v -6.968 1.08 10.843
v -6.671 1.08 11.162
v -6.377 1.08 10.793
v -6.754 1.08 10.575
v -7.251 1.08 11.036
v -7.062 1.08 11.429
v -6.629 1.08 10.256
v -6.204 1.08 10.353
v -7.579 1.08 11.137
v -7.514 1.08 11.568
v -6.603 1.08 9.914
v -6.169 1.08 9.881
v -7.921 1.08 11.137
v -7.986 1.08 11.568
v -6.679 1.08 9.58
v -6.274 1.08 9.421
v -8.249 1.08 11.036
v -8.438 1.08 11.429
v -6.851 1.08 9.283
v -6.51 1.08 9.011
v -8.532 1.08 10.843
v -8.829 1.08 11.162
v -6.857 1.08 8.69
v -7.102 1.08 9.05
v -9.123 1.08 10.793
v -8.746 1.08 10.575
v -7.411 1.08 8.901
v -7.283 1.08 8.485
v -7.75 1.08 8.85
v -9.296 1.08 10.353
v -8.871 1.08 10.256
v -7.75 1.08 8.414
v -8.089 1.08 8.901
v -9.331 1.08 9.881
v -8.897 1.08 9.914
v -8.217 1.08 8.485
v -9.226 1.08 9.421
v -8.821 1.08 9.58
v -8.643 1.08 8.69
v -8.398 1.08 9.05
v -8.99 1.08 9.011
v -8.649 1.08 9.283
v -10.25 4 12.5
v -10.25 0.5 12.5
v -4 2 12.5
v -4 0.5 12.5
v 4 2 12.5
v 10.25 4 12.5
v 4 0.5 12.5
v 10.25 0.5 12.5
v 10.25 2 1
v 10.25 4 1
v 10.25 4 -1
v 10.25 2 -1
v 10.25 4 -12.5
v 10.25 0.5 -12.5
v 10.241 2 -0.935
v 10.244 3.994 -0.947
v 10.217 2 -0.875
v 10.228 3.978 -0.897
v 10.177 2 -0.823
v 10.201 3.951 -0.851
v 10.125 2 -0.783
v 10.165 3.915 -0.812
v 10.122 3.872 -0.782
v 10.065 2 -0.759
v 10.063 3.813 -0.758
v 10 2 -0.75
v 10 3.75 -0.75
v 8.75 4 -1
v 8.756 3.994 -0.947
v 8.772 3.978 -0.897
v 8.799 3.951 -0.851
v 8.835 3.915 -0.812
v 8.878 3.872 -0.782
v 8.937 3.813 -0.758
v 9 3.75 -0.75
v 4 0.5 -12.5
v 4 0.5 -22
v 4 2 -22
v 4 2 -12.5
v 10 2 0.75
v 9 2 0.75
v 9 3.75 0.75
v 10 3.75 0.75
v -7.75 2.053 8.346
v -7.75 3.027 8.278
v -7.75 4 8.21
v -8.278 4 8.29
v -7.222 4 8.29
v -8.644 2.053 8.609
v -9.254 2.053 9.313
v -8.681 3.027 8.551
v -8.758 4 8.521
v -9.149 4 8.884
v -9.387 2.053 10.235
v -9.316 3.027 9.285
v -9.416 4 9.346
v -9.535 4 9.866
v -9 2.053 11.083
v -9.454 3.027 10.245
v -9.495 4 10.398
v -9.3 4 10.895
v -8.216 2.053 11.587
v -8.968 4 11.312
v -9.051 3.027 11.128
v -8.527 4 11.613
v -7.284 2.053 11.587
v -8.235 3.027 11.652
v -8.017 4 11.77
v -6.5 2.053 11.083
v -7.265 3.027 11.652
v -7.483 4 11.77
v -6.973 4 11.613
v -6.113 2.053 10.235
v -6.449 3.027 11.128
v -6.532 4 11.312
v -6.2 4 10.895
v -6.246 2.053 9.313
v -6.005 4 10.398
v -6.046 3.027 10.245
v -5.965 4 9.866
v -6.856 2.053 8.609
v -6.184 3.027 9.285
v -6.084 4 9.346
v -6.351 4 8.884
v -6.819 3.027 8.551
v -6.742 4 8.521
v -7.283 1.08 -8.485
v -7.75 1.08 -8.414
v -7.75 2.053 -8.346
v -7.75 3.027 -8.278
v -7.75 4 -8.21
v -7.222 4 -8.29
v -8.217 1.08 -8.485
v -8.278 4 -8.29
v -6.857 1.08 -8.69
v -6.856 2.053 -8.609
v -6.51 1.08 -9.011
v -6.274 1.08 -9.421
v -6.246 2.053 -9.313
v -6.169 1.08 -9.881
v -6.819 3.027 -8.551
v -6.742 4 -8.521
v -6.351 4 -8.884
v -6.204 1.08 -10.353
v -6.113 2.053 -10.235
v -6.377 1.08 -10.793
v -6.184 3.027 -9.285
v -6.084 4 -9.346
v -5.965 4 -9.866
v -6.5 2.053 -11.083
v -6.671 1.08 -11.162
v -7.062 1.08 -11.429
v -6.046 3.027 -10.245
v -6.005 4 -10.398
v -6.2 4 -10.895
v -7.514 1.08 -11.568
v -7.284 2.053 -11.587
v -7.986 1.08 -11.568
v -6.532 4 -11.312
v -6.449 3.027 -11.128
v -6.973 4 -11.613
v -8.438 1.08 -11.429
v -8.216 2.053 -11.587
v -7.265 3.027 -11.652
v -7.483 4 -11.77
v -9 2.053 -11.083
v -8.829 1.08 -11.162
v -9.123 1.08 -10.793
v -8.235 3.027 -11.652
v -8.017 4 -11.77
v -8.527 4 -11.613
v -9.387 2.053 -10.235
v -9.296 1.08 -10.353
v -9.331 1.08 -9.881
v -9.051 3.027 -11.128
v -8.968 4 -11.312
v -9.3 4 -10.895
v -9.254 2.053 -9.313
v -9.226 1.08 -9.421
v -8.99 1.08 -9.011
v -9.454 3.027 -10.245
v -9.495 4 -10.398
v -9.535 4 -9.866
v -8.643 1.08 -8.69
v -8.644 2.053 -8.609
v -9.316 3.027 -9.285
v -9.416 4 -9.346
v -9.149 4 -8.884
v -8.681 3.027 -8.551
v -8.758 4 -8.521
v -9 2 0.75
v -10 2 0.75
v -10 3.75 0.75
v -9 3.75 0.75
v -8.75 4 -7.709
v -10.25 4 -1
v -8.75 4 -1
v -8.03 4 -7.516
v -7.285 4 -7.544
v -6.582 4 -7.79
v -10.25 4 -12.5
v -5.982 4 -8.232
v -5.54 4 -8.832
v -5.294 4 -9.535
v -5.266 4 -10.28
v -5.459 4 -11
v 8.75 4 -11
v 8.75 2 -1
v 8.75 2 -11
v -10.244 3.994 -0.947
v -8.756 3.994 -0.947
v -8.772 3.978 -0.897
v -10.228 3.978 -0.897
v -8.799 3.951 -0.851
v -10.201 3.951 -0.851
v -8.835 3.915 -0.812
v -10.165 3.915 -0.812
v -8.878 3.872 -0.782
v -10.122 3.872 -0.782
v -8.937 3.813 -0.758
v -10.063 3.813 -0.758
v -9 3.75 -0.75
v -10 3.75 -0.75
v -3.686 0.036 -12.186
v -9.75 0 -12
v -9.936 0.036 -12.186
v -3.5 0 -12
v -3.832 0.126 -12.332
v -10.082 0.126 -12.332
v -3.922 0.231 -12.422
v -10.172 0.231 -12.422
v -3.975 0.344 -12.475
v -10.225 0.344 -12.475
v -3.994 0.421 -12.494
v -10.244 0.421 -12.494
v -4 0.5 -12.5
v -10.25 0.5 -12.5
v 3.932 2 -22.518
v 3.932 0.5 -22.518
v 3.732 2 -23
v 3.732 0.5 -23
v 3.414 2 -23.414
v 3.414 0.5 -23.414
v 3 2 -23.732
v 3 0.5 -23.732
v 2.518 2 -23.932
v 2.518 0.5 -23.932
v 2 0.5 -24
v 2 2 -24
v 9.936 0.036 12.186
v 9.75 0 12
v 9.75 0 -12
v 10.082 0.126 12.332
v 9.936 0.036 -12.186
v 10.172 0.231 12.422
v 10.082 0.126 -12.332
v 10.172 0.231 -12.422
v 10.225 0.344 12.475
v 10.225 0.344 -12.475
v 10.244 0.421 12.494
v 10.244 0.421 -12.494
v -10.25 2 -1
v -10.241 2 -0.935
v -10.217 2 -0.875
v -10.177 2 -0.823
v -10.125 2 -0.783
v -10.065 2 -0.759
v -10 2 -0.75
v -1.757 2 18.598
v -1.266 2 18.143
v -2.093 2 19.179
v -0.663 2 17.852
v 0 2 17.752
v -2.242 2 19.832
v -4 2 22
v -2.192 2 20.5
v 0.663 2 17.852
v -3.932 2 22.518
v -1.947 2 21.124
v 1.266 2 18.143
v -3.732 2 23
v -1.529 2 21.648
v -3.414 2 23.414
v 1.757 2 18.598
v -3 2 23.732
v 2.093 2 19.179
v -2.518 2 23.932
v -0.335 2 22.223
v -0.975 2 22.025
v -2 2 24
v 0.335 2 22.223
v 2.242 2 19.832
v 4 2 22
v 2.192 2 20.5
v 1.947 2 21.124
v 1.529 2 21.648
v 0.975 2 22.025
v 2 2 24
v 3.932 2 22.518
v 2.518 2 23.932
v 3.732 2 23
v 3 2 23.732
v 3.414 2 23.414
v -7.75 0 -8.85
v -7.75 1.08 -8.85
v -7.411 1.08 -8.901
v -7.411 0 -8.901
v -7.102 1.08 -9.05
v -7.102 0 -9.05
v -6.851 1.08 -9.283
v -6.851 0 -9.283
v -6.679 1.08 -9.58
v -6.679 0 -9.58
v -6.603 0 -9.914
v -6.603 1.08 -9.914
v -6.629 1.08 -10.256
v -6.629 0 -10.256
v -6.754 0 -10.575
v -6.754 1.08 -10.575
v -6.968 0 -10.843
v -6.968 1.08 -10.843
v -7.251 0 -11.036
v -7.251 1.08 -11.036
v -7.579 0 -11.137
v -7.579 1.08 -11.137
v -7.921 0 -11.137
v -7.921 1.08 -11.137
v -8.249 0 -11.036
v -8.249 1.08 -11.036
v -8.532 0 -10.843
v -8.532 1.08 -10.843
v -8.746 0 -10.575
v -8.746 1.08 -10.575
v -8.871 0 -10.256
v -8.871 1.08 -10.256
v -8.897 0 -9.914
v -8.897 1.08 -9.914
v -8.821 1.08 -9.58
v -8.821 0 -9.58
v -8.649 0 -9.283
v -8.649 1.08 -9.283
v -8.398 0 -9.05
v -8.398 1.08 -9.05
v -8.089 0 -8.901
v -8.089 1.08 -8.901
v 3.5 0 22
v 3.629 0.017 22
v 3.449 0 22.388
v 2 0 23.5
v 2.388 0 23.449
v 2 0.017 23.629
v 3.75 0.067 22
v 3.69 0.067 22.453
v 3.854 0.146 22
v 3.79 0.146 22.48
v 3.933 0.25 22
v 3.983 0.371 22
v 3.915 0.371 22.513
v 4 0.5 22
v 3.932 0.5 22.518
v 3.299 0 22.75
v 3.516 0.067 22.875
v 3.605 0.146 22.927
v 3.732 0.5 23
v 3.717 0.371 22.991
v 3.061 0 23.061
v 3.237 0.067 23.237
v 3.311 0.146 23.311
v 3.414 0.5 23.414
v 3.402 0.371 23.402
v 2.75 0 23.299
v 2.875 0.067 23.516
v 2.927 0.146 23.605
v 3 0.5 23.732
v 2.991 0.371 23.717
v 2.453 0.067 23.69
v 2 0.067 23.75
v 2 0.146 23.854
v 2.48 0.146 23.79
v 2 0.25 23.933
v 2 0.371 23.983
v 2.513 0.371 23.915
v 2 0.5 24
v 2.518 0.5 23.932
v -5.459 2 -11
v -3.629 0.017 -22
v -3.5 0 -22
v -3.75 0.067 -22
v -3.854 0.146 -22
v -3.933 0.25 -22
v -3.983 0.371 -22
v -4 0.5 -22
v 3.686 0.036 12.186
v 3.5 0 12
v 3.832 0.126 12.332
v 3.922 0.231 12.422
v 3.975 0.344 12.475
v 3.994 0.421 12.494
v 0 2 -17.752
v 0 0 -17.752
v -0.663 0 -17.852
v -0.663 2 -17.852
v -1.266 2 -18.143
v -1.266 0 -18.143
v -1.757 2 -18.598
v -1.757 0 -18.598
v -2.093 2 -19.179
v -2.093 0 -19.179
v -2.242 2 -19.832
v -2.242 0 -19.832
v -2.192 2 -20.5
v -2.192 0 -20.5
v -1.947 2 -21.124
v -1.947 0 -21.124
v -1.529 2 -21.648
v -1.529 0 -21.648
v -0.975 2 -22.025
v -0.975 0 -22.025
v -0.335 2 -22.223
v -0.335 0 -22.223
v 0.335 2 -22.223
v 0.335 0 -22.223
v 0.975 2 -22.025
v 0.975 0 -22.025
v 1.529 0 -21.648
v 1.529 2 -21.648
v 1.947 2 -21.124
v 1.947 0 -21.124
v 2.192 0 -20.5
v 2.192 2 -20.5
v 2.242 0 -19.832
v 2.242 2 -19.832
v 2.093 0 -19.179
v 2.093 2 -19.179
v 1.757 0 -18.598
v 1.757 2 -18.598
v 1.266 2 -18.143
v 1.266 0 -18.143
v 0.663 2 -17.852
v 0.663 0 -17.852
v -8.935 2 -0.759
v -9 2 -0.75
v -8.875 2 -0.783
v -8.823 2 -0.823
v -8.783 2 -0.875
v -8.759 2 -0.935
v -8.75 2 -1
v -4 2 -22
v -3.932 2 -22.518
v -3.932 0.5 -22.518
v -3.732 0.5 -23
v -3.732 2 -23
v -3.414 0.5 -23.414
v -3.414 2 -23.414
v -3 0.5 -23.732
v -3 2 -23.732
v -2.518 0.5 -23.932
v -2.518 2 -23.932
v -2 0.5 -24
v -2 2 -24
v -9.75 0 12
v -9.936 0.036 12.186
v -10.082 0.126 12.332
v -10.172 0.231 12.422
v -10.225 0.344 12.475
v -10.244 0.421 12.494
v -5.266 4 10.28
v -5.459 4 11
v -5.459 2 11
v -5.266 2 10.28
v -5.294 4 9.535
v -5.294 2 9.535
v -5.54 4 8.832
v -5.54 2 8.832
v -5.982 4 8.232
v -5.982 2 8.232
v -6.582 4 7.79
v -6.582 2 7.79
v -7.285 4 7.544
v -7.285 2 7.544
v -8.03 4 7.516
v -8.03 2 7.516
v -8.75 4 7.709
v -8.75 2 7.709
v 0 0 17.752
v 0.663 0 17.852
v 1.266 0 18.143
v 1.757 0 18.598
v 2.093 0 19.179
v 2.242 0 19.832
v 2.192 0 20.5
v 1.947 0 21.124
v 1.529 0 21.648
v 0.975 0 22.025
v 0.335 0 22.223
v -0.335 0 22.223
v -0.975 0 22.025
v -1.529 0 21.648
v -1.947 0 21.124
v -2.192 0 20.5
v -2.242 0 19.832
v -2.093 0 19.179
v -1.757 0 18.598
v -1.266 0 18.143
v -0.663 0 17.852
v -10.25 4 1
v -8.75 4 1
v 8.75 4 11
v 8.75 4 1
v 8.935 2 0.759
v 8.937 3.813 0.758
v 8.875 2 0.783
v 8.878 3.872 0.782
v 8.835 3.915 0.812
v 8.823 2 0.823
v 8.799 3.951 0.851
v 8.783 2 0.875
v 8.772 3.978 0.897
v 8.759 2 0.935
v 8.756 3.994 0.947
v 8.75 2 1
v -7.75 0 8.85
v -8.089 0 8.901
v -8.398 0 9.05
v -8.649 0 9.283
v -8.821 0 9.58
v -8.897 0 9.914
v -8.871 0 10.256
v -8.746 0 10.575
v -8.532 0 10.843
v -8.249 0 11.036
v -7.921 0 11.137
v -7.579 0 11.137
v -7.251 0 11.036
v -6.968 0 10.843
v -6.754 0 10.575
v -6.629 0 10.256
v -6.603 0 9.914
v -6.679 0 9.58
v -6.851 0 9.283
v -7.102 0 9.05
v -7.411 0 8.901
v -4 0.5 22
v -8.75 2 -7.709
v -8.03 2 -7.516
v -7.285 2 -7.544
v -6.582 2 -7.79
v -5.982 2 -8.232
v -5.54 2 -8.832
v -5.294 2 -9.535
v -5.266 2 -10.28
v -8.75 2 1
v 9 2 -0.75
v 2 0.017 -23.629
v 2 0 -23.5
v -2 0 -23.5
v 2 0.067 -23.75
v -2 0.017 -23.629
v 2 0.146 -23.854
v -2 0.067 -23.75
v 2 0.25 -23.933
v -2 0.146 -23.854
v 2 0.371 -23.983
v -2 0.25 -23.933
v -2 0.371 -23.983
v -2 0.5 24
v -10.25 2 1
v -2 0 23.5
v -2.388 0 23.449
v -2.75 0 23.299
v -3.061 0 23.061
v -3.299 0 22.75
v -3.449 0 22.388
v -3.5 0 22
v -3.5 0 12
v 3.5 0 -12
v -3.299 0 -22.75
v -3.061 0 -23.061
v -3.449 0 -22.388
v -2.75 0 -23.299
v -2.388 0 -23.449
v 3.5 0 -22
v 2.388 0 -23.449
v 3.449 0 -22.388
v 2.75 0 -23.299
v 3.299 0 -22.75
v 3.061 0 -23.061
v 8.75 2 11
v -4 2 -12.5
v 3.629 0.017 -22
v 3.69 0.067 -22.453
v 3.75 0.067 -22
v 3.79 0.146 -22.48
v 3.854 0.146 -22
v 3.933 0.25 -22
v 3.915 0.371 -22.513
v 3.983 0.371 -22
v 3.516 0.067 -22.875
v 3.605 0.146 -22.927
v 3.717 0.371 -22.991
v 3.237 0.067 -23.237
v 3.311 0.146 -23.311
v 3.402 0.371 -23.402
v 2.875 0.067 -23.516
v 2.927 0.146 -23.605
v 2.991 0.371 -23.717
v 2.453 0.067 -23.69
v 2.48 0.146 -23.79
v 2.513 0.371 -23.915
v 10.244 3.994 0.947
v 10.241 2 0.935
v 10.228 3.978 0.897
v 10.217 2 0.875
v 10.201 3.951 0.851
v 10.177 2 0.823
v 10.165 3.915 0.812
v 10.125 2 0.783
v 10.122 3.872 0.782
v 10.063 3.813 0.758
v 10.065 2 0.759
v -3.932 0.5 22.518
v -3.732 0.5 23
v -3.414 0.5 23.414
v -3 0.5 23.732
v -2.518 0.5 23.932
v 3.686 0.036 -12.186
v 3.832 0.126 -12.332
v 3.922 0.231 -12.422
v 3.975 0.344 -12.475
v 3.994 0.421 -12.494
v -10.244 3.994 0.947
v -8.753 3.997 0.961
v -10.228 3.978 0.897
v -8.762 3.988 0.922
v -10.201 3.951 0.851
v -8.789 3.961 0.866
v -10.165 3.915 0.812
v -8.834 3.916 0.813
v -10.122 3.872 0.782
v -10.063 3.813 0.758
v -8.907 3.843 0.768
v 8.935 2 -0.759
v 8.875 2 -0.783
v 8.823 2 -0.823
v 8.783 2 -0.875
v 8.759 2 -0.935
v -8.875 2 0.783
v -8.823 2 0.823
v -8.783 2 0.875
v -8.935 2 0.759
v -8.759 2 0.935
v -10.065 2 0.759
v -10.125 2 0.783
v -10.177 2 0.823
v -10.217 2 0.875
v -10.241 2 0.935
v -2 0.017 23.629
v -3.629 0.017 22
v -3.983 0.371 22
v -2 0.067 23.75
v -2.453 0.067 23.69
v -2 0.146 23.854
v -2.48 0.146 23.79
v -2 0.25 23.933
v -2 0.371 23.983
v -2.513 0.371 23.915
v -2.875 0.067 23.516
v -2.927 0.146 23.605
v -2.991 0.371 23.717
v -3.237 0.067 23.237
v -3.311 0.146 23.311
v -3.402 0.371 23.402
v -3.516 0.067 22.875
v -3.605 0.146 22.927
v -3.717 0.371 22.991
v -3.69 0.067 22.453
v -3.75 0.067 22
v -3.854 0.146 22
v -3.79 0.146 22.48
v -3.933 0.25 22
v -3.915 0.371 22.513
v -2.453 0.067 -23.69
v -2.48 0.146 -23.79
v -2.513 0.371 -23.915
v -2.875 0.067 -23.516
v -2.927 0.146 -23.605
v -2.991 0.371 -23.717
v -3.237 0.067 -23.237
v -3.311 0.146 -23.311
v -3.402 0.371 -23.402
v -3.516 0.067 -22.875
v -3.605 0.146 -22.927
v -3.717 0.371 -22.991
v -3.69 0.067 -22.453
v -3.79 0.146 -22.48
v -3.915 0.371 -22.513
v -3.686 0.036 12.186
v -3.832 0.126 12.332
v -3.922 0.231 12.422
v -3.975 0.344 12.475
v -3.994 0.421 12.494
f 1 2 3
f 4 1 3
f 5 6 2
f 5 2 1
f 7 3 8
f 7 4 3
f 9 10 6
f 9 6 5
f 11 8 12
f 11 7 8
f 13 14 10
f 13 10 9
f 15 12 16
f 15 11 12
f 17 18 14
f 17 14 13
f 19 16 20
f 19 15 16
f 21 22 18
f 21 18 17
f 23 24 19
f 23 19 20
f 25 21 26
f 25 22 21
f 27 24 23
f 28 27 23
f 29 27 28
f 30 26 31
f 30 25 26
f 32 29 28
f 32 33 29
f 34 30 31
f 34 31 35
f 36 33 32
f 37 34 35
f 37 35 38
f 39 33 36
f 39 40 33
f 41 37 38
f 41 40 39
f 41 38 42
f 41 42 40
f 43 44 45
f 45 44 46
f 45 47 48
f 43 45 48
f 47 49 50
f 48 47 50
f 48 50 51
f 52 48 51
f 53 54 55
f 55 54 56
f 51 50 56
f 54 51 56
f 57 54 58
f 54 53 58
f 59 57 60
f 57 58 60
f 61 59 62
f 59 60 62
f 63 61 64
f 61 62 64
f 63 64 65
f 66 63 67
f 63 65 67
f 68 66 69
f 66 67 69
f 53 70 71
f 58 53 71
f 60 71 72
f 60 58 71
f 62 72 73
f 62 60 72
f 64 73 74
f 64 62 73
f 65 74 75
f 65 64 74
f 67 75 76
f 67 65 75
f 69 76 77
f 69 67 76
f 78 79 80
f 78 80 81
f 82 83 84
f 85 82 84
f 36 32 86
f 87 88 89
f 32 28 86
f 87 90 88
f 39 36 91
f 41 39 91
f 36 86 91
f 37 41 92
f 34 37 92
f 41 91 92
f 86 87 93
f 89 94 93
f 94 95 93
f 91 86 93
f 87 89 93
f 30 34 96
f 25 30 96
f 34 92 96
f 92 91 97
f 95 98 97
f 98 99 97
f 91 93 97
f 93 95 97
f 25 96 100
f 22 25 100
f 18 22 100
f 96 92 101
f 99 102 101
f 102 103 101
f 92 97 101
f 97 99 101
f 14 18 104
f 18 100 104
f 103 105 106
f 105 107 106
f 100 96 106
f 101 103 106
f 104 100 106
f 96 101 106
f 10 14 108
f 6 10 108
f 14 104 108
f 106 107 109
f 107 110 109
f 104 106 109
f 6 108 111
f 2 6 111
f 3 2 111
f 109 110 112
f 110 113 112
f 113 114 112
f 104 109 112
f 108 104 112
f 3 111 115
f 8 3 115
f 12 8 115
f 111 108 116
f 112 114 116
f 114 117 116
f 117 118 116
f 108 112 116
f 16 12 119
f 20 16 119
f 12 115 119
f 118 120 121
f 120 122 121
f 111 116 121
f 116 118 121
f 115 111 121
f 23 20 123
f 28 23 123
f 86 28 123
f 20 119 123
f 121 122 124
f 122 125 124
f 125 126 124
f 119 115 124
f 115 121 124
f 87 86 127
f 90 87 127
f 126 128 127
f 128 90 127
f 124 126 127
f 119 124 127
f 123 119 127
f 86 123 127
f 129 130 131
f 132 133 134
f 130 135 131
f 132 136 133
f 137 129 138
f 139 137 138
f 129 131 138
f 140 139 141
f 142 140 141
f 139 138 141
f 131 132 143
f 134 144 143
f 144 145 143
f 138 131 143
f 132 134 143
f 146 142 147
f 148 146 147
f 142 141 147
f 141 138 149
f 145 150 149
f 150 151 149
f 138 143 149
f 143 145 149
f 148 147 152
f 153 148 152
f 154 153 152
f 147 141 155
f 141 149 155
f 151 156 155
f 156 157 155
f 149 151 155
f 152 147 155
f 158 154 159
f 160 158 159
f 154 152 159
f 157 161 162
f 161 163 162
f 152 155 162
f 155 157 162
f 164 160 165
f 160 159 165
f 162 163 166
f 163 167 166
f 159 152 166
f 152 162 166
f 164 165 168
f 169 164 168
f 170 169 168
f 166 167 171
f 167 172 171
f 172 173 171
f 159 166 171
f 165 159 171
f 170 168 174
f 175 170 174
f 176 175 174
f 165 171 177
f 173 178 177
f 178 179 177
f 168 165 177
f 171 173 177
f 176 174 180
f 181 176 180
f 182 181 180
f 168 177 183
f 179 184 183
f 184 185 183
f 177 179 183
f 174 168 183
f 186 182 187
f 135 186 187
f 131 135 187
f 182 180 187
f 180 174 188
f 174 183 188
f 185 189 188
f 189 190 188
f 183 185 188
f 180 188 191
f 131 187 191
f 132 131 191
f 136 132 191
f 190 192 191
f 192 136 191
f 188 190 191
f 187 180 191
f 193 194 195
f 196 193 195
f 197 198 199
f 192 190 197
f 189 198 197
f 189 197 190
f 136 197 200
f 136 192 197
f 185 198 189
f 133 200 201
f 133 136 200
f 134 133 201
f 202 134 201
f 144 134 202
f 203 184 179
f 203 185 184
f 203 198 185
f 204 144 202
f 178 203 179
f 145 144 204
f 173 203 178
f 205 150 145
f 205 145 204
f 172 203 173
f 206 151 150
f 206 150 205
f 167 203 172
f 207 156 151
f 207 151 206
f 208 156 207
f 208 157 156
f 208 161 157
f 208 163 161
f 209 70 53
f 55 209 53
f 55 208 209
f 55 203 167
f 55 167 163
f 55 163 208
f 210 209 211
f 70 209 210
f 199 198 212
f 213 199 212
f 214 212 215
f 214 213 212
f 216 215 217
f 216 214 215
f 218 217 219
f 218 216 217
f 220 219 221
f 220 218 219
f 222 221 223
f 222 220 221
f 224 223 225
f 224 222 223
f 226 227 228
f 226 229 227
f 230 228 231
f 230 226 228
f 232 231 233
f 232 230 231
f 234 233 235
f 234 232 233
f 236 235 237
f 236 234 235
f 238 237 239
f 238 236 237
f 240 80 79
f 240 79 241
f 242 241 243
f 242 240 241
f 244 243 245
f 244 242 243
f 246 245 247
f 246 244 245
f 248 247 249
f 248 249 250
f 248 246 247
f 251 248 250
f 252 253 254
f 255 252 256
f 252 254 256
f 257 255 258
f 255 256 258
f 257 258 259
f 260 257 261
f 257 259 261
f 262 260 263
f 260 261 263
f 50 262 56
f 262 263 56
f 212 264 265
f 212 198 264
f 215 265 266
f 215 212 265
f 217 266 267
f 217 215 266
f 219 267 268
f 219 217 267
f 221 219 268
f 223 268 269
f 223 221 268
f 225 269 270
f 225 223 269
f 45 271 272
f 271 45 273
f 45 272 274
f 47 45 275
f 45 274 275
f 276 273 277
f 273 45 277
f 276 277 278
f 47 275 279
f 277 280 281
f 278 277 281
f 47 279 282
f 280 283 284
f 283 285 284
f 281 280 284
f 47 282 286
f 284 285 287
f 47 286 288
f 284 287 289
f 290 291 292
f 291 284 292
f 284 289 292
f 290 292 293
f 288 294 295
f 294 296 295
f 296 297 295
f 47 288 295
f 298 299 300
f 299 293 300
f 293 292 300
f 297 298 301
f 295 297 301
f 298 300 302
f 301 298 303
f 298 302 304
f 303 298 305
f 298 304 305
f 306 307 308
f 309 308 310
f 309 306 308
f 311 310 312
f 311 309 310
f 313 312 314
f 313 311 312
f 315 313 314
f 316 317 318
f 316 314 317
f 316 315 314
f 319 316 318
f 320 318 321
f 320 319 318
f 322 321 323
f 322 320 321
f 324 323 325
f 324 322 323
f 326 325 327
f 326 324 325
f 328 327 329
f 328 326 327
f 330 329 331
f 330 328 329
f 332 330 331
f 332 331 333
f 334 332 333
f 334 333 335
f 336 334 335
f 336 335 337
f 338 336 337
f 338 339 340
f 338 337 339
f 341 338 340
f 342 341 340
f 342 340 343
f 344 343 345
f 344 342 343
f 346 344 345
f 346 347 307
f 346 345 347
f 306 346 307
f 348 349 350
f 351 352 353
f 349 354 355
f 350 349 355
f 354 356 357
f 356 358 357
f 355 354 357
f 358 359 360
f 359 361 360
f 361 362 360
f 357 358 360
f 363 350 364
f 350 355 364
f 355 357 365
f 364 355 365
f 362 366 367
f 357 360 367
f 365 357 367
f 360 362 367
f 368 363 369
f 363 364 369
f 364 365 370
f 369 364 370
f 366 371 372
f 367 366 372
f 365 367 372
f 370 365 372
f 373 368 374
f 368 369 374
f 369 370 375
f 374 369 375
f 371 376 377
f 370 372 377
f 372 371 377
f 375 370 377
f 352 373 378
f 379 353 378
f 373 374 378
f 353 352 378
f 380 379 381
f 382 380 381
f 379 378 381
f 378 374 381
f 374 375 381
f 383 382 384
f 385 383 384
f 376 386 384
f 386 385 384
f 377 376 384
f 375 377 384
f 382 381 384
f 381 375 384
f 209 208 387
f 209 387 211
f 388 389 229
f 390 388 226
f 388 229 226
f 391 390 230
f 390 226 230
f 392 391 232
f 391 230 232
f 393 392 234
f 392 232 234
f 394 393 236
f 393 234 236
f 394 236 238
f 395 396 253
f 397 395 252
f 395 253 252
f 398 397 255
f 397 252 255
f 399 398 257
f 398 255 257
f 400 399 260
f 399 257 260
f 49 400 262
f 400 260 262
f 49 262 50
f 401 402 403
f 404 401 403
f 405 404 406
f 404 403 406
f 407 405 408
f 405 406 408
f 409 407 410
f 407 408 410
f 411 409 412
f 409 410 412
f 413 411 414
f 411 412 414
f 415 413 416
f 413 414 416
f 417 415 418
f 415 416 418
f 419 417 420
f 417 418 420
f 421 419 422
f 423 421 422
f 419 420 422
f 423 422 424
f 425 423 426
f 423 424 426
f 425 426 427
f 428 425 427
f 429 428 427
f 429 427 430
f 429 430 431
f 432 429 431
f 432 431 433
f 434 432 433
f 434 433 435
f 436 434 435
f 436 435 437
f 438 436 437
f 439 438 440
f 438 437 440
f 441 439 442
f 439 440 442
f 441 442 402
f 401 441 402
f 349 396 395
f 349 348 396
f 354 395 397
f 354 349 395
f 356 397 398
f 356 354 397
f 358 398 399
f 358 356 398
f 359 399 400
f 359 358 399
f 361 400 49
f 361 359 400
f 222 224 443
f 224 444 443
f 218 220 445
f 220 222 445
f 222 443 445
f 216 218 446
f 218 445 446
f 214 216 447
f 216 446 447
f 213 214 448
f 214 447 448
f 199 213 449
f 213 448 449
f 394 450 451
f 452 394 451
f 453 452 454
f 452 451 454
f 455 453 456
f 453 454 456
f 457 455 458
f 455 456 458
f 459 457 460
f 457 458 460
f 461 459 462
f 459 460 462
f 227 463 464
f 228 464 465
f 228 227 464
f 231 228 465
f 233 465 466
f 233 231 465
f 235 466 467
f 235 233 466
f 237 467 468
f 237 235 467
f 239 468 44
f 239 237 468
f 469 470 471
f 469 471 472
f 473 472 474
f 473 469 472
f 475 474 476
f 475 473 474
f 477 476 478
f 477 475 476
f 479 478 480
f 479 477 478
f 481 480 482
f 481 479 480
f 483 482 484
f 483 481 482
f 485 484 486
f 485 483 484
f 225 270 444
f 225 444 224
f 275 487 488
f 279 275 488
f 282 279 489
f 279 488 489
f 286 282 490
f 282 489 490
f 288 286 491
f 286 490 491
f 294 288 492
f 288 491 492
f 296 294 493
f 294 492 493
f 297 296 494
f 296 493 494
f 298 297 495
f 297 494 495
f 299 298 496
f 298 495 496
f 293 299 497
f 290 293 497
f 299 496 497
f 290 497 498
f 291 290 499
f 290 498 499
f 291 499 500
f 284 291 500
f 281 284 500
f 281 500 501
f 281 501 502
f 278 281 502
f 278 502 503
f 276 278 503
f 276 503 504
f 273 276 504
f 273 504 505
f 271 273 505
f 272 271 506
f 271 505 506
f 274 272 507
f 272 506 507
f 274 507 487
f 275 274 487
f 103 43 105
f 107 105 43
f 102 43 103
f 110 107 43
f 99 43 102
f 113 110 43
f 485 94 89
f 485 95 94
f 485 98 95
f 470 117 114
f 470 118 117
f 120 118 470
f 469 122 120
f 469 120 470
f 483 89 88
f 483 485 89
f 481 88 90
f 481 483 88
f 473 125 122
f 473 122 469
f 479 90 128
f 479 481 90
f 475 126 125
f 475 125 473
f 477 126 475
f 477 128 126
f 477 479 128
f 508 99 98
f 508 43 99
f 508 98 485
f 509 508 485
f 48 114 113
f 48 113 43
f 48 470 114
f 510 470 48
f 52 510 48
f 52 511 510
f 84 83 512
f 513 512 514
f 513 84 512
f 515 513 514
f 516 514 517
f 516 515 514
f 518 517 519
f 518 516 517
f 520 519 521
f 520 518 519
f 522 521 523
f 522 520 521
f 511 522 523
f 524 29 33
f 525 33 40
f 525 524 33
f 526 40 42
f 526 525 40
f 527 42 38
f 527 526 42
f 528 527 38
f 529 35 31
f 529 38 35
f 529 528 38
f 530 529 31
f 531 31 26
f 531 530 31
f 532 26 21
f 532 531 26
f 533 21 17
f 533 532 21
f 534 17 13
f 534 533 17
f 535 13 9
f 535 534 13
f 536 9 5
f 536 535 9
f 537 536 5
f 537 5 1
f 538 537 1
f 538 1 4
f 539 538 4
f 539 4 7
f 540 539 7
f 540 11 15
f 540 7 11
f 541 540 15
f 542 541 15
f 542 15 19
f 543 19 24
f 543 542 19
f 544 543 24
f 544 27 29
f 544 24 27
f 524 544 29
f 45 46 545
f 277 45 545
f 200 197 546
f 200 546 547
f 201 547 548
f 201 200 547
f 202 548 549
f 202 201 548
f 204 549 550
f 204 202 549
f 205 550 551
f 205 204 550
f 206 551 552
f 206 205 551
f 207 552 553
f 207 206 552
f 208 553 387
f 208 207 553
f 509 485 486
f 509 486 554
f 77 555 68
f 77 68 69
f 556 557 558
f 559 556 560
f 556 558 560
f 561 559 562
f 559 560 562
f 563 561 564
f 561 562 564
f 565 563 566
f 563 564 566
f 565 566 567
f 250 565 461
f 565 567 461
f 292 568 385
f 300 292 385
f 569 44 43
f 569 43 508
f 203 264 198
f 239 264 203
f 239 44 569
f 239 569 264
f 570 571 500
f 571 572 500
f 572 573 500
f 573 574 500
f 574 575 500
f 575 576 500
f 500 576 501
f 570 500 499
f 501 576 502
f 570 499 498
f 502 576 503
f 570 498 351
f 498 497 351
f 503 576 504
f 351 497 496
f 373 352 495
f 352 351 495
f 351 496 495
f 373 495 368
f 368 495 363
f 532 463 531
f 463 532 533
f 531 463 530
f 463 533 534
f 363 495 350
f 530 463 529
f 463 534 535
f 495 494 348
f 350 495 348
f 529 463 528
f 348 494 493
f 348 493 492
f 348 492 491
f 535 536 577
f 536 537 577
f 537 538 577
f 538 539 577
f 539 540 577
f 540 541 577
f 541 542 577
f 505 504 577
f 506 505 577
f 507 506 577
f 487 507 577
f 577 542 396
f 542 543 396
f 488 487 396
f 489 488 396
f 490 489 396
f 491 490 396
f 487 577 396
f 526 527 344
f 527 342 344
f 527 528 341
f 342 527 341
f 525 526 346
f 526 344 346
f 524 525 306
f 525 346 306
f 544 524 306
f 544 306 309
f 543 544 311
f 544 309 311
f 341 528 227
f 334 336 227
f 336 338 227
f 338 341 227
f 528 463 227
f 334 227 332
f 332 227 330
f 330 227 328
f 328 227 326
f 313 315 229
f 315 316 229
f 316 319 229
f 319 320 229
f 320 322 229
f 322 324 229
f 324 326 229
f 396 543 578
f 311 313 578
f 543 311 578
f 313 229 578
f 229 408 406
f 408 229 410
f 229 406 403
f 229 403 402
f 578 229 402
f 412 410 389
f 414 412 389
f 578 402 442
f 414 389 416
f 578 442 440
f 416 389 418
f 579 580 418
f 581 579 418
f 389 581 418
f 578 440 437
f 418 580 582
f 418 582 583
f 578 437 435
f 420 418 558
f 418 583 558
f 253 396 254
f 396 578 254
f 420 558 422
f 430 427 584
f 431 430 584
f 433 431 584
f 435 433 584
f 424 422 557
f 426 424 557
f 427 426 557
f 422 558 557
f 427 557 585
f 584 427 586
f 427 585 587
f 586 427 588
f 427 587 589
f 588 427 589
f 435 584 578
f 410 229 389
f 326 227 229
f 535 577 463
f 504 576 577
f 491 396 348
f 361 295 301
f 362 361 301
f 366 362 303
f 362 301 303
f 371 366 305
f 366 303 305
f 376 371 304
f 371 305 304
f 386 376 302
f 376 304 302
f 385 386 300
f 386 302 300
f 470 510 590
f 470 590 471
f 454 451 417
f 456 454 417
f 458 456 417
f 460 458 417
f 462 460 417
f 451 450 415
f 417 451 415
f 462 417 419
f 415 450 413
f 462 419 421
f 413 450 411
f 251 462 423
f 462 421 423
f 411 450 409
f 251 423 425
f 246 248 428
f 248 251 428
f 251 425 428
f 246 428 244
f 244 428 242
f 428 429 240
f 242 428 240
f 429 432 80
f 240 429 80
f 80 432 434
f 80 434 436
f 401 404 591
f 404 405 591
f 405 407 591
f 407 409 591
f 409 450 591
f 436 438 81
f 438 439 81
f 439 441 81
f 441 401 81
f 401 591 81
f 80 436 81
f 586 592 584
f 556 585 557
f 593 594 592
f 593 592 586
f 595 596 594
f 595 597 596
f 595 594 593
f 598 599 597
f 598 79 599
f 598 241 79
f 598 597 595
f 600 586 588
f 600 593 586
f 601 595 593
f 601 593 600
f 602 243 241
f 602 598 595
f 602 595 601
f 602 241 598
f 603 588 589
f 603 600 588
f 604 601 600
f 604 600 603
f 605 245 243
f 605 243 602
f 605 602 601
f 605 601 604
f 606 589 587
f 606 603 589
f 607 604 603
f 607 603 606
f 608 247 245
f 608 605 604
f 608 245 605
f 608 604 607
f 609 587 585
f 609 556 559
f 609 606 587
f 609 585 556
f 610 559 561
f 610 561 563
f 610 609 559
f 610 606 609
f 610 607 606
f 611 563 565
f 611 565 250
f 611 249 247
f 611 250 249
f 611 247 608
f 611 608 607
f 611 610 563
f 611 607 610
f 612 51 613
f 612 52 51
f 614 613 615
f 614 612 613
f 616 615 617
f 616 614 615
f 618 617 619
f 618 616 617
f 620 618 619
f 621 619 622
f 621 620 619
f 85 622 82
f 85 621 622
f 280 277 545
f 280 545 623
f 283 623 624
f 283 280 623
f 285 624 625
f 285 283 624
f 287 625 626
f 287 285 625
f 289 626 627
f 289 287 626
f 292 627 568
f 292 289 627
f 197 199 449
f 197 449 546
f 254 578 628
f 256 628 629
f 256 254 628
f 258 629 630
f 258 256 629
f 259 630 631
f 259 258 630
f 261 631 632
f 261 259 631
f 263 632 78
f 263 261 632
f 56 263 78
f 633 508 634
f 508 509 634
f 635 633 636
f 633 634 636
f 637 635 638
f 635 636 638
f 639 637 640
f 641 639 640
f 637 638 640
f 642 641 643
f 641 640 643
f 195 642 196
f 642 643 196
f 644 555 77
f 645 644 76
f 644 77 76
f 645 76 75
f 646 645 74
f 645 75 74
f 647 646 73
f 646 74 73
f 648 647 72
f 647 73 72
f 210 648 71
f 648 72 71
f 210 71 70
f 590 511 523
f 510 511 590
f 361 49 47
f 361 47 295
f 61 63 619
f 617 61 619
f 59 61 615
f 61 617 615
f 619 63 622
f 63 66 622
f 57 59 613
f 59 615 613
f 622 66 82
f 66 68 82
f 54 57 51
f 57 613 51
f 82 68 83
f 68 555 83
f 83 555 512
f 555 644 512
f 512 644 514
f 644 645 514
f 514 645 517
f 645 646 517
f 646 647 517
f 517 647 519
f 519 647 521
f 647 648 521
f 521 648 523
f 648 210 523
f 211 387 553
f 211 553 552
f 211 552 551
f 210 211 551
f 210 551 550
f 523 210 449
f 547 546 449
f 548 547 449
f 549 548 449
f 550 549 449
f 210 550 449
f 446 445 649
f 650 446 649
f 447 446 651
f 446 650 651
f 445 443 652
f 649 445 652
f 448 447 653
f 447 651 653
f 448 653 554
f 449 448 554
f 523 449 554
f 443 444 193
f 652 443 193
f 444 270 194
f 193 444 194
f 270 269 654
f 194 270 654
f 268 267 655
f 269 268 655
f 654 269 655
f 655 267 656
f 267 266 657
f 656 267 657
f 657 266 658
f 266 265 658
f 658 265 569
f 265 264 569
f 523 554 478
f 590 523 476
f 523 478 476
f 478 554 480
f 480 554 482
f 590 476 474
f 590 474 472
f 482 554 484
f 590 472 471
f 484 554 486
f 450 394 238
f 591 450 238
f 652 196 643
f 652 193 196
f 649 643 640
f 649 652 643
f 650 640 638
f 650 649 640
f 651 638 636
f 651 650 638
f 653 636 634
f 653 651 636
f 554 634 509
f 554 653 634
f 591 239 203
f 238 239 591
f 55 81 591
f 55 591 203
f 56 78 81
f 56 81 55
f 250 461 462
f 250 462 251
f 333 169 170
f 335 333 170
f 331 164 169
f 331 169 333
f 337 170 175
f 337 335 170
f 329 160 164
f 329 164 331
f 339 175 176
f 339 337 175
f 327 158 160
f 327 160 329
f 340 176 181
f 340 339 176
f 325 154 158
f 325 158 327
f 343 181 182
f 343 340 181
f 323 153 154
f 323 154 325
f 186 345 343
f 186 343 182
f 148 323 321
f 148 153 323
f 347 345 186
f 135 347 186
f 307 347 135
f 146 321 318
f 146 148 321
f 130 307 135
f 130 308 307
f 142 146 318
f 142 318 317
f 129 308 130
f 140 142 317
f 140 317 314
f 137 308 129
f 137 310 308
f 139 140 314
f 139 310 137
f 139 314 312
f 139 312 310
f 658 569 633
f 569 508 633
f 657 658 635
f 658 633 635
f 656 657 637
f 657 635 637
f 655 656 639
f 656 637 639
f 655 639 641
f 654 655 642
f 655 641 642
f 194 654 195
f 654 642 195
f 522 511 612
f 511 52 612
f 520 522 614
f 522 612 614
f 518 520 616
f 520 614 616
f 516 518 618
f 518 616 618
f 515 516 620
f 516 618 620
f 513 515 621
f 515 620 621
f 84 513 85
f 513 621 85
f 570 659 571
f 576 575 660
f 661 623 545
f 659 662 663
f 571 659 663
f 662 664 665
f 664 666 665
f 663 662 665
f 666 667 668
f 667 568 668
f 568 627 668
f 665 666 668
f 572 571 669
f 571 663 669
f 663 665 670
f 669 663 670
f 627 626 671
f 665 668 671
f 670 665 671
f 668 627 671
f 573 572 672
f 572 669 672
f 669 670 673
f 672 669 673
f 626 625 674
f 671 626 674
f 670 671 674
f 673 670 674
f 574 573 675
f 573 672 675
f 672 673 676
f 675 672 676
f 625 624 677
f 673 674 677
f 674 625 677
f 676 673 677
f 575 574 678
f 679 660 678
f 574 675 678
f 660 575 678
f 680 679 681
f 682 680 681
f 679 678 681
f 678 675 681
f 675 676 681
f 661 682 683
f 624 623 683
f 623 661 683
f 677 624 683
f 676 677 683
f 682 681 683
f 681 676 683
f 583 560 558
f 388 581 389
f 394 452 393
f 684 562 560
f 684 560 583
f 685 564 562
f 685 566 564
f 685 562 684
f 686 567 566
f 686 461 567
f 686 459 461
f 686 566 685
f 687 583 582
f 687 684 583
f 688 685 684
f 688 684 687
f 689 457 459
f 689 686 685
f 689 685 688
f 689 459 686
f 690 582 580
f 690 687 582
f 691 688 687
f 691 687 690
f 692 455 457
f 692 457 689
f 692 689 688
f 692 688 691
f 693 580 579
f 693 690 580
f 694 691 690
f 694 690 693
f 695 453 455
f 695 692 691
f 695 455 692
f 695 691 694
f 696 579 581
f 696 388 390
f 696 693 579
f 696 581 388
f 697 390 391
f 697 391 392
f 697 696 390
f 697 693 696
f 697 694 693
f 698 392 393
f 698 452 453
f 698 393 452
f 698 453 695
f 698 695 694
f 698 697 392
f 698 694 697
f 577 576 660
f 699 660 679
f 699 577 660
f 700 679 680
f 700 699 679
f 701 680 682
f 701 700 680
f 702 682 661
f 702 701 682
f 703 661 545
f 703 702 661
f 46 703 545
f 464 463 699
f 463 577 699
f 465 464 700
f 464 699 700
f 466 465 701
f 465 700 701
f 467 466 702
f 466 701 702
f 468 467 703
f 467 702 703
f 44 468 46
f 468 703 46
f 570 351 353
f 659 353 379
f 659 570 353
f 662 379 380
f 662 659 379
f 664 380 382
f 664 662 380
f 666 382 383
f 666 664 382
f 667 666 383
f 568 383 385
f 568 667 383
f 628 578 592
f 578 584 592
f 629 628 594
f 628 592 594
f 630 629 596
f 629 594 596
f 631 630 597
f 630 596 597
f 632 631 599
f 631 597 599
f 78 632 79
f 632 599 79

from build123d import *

# Parameters (mm, degrees)
SKETCH2_W           = 20.5
SKETCH2_H           = 25
SKETCH2_R           = 1.15
BOSS_EXTRUDE1_DEPTH = 4
SKETCH3_OUTSIDE_W   = 29.016
SKETCH3_OUTSIDE_H   = 33.516
SKETCH3_OUTSIDE_W_2 = 20.5
SKETCH3_OUTSIDE_H_2 = 25
CUT_EXTRUDE1_DEPTH  = 2
SKETCH4_R           = 1.79
CUT_EXTRUDE2_DEPTH  = 2.92
DRAFT1_ANGLE        = 4
SKETCH5_W           = 8
SKETCH5_H           = 11.5
SKETCH5_R           = 2.2479
BOSS_EXTRUDE2_DEPTH = 2
FILLET1_R           = 2
FILLET2_R           = 0.5
SKETCH7_W           = 1.5
SKETCH7_H           = 2
CUT_EXTRUDE4_DEPTH  = 32.81587654
FILLET3_R           = 0.25


with BuildPart() as part:
    # Sketch2 → Boss-Extrude1 (new body)
    with BuildSketch(Plane(origin=(0, 0, 0), x_dir=(1, 0, 0), z_dir=(0, 1, 0))):
        Rectangle(SKETCH2_W, SKETCH2_H)
        with Locations(Location((-7.75, 10, 0), (0, 0, 270))):
            Circle(SKETCH2_R, mode=Mode.SUBTRACT)
        with Locations(Location((-7.75, -10, 0), (0, 0, 90))):
            Circle(SKETCH2_R, mode=Mode.SUBTRACT)
    extrude(amount=BOSS_EXTRUDE1_DEPTH)

    # Sketch3 outside → Cut-Extrude1 (cut)
    # profile 1 of 2: a face of its own
    with BuildSketch(Plane(origin=(0, 4, 0), x_dir=(1, 0, 0), z_dir=(0, 1, 0))):
        Rectangle(SKETCH3_OUTSIDE_W, SKETCH3_OUTSIDE_H)
        Rectangle(SKETCH3_OUTSIDE_W_2, SKETCH3_OUTSIDE_H_2, mode=Mode.SUBTRACT)
    # profile 2 of 2: a face of its own
    with BuildSketch(Plane(origin=(0, 4, 0), x_dir=(1, 0, 0), z_dir=(0, 1, 0))):
        with BuildLine():
            Line((-5.458712153, 11), (8.75, 11))
            Line((8.75, 11), (8.75, -11))
            Line((8.75, -11), (-5.458712153, -11))
            ThreePointArc((-5.458712153, -11), (-5.982233047, -8.232233047), (-8.75, -7.708712153))
            Line((-8.75, -7.708712153), (-8.75, 7.708712153))
            ThreePointArc((-8.75, 7.708712153), (-5.982233047, 8.232233047), (-5.458712153, 11))
        make_face()
    extrude(amount=-CUT_EXTRUDE1_DEPTH, mode=Mode.SUBTRACT)

    # Sketch4 → Cut-Extrude2 (cut)
    with BuildSketch(Plane(origin=(0, 4, 0), x_dir=(1, 0, 0), z_dir=(0, 1, 0))):
        with Locations(Location((-7.75, 10, 0), (0, 0, 270))):
            Circle(SKETCH4_R)
        with Locations(Location((-7.75, -10, 0), (0, 0, 90))):
            Circle(SKETCH4_R)
    extrude(amount=-CUT_EXTRUDE2_DEPTH, mode=Mode.SUBTRACT)

    # Draft1
    draft1_faces = [part.faces().sort_by_distance(p)[0] for p in [
        (-7.75, 2.54, 11.79),
        (-7.75, 2.54, -11.79),
    ]]
    draft(draft1_faces, Plane.ZX.offset(4), DRAFT1_ANGLE)

    # Sketch5 → Boss-Extrude2 (add)
    # profile 1 of 2: a face of its own
    with BuildSketch(Plane.XZ):
        with Locations((0, 18.25)):
            Rectangle(SKETCH5_W, SKETCH5_H)
        with Locations(Location((0, 20, 0), (0, 0, 270))):
            Circle(SKETCH5_R, mode=Mode.SUBTRACT)
    # profile 2 of 2: a face of its own
    with BuildSketch(Plane.XZ):
        with Locations((0, -18.25)):
            Rectangle(SKETCH5_W, SKETCH5_H)
        with Locations(Location((0, -20, 0), (0, 0, 90))):
            Circle(SKETCH5_R, mode=Mode.SUBTRACT)
    extrude(amount=-BOSS_EXTRUDE2_DEPTH)

    # Fillet1
    fillet1_edges = [part.edges().sort_by_distance(p)[0] for p in [
        (4, 1, 24),
        (-4, 1, 24),
        (4, 1, -24),
        (-4, 1, -24),
    ]]
    fillet(fillet1_edges, radius=FILLET1_R)

    # Fillet2
    fillet2_edges = [part.edges().sort_by_distance(p)[0] for p in [
        (7.125, 0, 12.5),
        (4, 0, 17.25),
        (-7.125, 0, -12.5),
        (-4, 0, -17.25),
        (0, 0, 24),
        (-4, 0, 17.25),
        (0, 0, -24),
        (4, 0, -17.25),
        (-3.414213562, 0, 23.414213562),
        (3.414213562, 0, 23.414213562),
        (3.414213562, 0, -23.414213562),
        (-3.414213562, 0, -23.414213562),
        (-7.125, 0, 12.5),
        (-10.25, 0, 0),
        (7.125, 0, -12.5),
        (10.25, 0, 0),
    ]]
    fillet(fillet2_edges, radius=FILLET2_R)

    # Sketch7 → Cut-Extrude4 (cut, through all)
    with BuildSketch(Plane.ZY.offset(10.25)):
        with Locations((0, 3)):
            Rectangle(SKETCH7_W, SKETCH7_H)
    extrude(amount=-CUT_EXTRUDE4_DEPTH, mode=Mode.SUBTRACT)

    # Fillet3
    fillet3_edges = [part.edges().sort_by_distance(p)[0] for p in [
        (9.5, 4, -0.75),
        (-9.5, 4, -0.75),
        (9.5, 4, 0.75),
        (8.75, 3, 0.75),
        (10.25, 3, 0.75),
        (-8.75, 3, 0.75),
        (-9.5, 4, 0.75),
        (8.75, 3, -0.75),
        (10.25, 3, -0.75),
        (-8.75, 3, -0.75),
        (-10.25, 3, 0.75),
        (-10.25, 3, -0.75),
    ]]
    fillet(fillet3_edges, radius=FILLET3_R)


solid = part.part
